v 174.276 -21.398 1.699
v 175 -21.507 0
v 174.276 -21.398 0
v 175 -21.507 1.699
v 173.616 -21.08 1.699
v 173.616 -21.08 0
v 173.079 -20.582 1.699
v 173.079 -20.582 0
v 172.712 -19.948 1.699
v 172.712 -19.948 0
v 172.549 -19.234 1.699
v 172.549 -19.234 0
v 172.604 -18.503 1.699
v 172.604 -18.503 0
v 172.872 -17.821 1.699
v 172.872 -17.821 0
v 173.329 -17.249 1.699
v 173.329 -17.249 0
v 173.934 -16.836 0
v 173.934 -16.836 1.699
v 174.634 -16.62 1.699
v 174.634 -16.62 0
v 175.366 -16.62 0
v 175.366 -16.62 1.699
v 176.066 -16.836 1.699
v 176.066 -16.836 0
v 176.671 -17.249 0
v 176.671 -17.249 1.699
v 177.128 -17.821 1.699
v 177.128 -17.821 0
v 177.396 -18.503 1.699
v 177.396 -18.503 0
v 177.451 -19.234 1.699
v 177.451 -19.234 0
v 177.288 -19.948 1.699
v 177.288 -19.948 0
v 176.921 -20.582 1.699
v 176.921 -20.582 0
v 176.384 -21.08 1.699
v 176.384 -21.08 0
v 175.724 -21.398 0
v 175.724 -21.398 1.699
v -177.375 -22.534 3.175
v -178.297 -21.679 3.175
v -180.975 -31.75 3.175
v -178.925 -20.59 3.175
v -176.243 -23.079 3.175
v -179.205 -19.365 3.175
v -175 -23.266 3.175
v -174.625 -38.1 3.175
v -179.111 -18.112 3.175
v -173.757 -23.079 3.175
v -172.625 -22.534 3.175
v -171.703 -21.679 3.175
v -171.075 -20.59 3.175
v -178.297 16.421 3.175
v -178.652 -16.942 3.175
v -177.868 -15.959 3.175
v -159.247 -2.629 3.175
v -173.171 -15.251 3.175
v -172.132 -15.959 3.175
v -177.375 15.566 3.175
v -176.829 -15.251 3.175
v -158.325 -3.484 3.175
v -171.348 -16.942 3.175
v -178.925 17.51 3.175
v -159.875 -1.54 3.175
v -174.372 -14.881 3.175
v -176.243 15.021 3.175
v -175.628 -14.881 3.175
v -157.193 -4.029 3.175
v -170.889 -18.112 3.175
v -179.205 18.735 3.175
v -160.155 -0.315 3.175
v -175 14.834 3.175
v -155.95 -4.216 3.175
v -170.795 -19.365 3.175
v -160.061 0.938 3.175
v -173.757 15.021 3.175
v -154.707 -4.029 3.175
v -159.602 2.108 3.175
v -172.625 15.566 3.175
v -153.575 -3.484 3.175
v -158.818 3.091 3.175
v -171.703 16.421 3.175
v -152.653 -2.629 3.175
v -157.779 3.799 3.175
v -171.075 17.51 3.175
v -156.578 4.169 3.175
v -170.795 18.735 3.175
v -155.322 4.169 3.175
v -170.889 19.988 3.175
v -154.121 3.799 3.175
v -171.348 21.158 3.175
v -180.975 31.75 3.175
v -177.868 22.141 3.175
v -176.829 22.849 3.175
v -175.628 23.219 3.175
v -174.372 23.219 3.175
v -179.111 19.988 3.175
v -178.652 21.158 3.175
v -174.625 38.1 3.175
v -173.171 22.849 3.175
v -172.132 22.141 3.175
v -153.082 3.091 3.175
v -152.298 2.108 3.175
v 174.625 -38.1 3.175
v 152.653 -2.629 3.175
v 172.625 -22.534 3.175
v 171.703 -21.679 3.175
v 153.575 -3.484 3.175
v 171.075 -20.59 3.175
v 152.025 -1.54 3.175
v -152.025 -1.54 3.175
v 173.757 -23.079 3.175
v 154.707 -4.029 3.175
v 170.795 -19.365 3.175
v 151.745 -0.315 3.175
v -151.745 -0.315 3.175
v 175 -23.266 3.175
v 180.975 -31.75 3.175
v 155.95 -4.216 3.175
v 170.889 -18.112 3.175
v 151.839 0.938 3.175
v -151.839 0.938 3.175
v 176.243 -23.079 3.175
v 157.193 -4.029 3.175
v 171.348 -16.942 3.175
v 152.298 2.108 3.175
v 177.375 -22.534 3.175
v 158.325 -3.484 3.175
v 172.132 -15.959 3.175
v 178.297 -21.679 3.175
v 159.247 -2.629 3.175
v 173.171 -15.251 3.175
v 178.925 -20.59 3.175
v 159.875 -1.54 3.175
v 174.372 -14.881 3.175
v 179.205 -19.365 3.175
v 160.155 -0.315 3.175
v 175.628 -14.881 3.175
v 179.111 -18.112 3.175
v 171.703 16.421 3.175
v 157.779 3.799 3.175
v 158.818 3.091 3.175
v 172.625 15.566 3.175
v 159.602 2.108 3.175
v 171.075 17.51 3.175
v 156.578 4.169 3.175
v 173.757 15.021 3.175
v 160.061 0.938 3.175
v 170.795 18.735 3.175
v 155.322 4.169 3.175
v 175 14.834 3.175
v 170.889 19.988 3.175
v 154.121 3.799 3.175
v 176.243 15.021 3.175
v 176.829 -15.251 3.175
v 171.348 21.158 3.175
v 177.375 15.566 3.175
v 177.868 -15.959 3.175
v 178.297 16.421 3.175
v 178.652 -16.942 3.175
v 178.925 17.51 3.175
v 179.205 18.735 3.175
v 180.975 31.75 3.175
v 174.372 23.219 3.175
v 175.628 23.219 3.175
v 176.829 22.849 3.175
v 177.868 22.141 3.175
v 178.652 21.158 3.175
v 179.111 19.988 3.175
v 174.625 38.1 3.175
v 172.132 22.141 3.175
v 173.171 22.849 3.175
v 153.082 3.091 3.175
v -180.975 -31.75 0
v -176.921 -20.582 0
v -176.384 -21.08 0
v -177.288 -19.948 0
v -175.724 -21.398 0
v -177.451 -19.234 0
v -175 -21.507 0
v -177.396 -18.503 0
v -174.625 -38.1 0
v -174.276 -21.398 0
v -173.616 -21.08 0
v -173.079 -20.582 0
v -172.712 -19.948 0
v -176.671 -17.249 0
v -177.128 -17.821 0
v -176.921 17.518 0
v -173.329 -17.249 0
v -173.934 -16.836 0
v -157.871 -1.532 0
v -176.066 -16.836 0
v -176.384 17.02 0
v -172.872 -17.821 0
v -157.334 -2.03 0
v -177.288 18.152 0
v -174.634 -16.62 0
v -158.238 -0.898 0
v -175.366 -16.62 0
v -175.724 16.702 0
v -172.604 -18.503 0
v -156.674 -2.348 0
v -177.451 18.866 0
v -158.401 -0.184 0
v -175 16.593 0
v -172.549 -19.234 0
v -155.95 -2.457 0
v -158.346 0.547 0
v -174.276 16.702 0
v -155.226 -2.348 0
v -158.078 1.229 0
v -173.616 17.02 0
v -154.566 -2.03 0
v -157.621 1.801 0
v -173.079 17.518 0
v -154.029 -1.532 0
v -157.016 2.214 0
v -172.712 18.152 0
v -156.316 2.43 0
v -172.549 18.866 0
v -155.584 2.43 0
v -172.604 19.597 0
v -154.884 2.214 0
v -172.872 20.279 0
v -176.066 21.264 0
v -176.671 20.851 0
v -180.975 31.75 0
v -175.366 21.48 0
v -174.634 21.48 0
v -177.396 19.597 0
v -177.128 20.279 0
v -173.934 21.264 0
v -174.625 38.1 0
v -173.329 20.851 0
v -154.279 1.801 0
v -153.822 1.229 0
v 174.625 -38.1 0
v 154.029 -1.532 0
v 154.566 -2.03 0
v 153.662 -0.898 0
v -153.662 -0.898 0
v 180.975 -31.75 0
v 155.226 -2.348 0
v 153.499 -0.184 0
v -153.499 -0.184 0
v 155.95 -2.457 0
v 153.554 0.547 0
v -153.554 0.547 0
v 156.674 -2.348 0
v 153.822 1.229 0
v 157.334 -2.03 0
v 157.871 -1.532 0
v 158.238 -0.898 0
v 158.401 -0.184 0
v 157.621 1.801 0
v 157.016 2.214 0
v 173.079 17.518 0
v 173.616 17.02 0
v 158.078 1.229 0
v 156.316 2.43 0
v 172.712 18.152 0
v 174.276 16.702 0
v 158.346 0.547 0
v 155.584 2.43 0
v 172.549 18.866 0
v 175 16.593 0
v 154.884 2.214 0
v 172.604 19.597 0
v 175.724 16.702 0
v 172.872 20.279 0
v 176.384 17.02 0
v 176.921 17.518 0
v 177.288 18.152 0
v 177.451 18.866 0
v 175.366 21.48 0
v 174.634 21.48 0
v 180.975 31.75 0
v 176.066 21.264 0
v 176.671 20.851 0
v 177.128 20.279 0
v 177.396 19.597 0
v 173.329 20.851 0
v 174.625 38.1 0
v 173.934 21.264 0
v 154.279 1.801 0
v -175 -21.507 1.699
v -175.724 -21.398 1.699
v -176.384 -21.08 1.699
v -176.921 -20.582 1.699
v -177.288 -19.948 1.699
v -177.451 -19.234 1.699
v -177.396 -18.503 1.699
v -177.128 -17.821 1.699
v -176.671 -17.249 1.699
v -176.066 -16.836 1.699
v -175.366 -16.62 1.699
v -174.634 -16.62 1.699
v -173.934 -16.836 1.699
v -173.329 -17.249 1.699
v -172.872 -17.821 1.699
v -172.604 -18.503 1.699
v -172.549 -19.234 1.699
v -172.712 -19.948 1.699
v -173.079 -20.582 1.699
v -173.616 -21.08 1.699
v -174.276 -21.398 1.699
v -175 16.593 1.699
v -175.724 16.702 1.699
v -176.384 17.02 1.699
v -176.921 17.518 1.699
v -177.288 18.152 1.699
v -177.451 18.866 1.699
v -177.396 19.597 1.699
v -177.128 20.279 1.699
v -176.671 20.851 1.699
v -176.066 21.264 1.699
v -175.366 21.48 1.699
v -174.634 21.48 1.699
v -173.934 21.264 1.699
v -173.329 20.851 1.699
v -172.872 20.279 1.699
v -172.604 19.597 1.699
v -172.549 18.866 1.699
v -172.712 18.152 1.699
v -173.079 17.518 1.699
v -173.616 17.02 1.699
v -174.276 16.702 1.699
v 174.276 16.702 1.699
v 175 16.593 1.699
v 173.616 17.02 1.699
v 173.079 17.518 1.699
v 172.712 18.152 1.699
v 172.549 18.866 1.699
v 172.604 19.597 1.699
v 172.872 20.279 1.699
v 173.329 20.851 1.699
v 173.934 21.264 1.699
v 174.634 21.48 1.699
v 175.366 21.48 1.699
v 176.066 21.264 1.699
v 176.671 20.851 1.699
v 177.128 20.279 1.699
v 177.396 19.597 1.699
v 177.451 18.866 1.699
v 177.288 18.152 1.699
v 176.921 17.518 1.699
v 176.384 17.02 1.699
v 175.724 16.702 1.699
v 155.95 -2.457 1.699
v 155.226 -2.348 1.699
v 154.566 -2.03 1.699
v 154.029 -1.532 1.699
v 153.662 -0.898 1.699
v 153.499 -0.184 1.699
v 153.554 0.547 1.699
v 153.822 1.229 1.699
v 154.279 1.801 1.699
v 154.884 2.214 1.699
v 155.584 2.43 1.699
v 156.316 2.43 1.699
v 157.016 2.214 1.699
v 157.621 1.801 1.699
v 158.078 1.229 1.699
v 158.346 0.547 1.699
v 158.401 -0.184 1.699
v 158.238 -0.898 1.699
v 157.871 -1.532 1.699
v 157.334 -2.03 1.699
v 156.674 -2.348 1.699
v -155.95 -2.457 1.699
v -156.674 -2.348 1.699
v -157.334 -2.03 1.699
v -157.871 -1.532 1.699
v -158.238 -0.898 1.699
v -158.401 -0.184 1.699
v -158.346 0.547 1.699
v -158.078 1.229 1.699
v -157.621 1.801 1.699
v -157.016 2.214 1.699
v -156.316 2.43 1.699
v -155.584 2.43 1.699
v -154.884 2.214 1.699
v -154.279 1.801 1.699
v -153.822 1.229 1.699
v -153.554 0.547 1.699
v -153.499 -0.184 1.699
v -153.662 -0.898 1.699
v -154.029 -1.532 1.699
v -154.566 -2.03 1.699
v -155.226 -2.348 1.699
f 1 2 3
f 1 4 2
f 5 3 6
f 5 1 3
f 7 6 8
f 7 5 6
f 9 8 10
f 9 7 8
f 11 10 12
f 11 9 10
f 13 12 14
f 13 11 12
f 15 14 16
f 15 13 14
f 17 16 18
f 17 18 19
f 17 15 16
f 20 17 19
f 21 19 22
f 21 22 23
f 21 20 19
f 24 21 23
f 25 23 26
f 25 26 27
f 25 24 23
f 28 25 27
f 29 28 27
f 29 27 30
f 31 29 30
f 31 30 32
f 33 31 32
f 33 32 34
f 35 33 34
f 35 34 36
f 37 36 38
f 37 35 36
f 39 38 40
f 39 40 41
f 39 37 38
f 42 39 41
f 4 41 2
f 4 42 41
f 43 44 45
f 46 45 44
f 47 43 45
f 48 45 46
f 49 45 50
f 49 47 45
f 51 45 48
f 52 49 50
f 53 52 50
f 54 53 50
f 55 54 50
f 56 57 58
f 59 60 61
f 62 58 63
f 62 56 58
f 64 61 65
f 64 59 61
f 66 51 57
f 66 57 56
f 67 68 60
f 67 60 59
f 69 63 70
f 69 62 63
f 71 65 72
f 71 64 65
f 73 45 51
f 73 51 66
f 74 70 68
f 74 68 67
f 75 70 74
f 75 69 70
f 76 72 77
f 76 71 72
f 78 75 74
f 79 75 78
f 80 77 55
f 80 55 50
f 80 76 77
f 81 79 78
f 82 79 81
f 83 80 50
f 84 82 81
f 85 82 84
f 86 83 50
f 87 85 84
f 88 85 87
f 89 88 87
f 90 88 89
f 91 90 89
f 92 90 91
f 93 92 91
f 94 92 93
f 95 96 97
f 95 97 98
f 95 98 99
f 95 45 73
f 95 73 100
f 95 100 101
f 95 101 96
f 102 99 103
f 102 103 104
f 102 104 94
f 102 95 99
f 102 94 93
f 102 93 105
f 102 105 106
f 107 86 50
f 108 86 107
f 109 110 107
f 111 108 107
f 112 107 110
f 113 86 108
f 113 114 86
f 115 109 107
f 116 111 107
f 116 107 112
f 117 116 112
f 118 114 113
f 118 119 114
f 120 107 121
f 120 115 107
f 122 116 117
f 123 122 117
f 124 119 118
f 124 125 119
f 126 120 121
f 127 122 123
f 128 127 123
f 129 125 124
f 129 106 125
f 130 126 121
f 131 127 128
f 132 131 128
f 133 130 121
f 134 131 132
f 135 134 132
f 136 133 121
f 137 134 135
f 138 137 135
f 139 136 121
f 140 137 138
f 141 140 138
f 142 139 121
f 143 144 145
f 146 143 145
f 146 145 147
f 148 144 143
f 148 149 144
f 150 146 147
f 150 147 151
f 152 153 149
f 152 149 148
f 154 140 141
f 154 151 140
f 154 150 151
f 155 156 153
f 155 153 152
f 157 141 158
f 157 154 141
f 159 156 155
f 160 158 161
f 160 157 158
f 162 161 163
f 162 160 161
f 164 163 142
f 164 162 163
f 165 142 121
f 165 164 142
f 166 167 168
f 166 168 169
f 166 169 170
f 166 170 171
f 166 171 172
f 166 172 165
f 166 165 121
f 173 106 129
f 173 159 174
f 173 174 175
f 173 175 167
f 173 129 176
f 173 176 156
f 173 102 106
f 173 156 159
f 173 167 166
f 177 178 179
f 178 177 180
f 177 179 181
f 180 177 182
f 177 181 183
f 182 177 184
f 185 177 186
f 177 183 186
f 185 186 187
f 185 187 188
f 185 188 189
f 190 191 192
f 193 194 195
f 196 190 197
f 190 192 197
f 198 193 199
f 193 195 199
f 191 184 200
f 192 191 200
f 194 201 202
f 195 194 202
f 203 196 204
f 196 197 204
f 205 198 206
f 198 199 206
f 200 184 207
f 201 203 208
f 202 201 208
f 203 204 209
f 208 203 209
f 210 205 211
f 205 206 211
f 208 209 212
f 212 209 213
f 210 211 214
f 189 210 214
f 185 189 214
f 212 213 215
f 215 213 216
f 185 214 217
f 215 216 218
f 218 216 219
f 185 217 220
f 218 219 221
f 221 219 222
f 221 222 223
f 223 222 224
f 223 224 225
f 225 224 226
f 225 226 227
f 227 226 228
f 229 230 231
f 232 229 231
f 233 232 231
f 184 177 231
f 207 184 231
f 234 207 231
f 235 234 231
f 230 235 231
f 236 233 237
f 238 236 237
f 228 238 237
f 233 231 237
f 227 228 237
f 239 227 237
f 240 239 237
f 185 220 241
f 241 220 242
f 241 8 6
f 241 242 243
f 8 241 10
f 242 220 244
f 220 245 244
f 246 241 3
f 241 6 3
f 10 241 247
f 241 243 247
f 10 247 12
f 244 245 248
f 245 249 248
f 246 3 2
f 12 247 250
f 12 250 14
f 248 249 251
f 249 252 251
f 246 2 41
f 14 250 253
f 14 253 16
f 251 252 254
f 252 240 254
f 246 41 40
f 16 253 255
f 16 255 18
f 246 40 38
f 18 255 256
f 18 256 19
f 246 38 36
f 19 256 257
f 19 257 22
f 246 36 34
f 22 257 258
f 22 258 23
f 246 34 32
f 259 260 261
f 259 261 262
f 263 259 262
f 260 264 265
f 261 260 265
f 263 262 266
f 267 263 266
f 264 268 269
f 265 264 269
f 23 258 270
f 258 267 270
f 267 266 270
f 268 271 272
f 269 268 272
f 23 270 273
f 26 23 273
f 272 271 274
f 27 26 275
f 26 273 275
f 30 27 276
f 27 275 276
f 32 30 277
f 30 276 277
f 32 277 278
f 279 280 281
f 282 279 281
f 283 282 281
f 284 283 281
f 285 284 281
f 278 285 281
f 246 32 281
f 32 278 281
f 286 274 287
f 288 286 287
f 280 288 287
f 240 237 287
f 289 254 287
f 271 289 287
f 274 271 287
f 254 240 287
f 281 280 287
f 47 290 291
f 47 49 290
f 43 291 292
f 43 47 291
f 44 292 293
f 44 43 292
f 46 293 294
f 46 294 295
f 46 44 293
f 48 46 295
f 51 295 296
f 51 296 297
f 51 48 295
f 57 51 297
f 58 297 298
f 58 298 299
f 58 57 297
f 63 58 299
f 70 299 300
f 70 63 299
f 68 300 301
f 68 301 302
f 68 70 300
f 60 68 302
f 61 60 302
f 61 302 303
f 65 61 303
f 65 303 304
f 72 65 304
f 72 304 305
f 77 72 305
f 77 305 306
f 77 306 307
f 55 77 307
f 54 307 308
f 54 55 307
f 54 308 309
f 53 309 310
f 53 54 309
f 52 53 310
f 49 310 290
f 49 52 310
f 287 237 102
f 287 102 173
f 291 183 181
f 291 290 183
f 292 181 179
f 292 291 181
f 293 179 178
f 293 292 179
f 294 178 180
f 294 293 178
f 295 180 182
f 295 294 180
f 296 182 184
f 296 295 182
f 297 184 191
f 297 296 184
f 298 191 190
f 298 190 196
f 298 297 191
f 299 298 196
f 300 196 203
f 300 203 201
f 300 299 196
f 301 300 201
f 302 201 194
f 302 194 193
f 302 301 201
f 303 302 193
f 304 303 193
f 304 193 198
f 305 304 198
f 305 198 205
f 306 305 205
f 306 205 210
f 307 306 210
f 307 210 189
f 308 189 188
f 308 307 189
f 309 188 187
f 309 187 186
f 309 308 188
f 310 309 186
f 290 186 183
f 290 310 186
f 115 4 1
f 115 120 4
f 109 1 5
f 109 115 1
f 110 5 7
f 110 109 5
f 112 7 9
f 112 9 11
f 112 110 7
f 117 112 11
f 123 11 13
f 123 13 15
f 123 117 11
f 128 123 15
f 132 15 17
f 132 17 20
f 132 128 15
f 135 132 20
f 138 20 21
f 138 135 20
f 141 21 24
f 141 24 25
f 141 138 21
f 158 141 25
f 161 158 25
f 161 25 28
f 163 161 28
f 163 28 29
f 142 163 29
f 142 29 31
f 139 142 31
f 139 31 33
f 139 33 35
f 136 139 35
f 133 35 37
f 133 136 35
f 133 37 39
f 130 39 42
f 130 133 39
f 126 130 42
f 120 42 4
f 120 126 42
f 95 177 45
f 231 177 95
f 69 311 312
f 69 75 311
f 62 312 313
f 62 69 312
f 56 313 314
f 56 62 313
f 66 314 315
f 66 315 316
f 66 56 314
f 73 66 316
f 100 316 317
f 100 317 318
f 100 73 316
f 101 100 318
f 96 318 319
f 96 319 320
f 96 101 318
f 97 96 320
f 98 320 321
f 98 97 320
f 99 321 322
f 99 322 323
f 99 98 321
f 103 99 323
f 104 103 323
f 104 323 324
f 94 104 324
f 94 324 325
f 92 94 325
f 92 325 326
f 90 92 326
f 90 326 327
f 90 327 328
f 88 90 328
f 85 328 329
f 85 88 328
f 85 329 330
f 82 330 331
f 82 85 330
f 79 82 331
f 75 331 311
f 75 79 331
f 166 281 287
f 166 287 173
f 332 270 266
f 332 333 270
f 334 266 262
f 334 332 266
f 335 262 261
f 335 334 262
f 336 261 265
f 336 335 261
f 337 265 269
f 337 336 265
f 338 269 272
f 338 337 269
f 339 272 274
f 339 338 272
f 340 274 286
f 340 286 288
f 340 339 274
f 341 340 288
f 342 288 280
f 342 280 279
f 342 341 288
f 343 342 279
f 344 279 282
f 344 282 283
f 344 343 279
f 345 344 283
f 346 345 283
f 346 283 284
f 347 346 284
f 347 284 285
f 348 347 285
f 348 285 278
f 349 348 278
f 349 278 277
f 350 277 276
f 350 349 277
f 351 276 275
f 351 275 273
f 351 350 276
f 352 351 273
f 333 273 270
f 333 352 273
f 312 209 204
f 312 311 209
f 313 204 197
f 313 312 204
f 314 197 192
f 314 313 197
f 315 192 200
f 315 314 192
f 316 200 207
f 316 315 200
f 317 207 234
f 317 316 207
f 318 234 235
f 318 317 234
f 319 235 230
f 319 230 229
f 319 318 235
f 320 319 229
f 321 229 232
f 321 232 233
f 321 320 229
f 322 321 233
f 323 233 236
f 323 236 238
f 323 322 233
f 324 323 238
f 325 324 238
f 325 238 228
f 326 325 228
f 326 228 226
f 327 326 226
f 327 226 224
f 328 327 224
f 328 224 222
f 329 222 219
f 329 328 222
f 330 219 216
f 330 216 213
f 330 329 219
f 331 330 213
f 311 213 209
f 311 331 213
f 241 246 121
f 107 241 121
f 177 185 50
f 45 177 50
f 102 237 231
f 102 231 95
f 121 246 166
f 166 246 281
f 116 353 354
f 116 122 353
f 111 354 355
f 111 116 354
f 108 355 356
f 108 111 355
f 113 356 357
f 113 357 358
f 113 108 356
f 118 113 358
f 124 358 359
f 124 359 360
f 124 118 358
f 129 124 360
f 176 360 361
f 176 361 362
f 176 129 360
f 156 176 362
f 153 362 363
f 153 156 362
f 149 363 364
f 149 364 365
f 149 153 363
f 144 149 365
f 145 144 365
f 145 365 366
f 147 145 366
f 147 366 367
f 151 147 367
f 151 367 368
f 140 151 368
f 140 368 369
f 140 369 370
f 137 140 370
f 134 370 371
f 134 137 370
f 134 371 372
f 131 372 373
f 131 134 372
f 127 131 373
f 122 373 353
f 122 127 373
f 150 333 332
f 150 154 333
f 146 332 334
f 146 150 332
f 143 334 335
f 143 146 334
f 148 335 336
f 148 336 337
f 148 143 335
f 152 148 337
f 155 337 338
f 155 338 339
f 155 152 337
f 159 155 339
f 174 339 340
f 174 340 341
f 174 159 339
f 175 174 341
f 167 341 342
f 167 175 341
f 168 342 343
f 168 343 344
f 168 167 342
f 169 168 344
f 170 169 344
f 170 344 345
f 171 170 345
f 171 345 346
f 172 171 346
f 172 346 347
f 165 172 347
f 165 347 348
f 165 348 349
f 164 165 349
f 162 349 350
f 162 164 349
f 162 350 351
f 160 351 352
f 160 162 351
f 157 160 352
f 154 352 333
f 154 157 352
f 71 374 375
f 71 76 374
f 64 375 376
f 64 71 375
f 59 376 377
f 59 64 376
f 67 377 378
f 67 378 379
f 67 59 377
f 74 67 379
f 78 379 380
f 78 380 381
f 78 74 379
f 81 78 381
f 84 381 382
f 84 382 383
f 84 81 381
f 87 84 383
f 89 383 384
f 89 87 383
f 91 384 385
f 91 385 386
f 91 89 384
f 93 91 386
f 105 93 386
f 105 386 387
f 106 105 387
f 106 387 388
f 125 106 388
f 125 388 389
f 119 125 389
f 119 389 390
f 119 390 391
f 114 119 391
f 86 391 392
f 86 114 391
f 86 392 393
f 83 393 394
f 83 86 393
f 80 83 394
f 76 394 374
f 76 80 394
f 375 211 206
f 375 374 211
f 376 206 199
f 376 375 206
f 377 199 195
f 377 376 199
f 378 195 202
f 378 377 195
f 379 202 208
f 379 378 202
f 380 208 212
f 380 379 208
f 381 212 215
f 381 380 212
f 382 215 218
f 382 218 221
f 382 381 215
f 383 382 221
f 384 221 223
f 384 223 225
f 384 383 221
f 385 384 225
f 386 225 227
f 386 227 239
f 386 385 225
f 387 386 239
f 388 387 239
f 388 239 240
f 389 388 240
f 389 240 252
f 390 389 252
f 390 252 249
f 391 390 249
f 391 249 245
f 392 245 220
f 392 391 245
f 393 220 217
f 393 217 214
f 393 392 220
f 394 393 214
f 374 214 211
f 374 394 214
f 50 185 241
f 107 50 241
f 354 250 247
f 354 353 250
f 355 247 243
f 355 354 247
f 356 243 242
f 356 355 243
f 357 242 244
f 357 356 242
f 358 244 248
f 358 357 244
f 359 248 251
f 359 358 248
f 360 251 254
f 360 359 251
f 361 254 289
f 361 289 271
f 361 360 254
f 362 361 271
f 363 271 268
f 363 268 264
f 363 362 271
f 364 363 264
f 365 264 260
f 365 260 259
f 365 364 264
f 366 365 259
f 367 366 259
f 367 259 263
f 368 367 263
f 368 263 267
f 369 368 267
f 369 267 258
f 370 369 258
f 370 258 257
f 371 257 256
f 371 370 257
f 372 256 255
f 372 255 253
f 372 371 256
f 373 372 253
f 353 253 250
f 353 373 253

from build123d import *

# Parameters (mm, degrees)
SKETCH1_W                                 = 361.95
SKETCH1_H                                 = 76.2
BOSS_EXTRUDE1_DEPTH                       = 3.175
CSK_FOR_8_FLAT_HEAD_MACHINE_SCREW_2_COUNT = 2
CSK_FOR_8_FLAT_HEAD_MACHINE_SCREW_2_PITCH = 349.999999988
CSK_FOR_8_FLAT_HEAD_MACHINE_SCREW_3_COUNT = 2
CSK_FOR_8_FLAT_HEAD_MACHINE_SCREW_3_PITCH = 352.067621334
CSK_FOR_8_FLAT_HEAD_MACHINE_SCREW_4_COUNT = 2
CSK_FOR_8_FLAT_HEAD_MACHINE_SCREW_4_PITCH = 331.497820494
CSK_FOR_8_FLAT_HEAD_MACHINE_SCREW_5_COUNT = 2
CSK_FOR_8_FLAT_HEAD_MACHINE_SCREW_5_PITCH = 26.940768363
CSK_FOR_8_FLAT_HEAD_MACHINE_SCREW_6_COUNT = 2
CSK_FOR_8_FLAT_HEAD_MACHINE_SCREW_6_PITCH = 38.1
CHAMFER1_SIZE                             = 6.35


with BuildPart() as part:
    # Sketch1 → Boss-Extrude1 (new body)
    with BuildSketch(Plane.XY):
        Rectangle(SKETCH1_W, SKETCH1_H)
    extrude(amount=BOSS_EXTRUDE1_DEPTH)

    # Sketch3 → CSK for #8 Flat Head Machine Screw (100)1 (revolve, cut)
    with BuildSketch(Plane(origin=(-174.999999994, 19.05, 3.175), x_dir=(0, -1, 0), z_dir=(1, 0, 0))):
        Polygon((0, 0), (0, 3.175), (2.45745, 3.175), (2.45745, 1.475934296), (4.2164, 0), align=None)
    csk_for_8_flat_head_machine_screw_100 = revolve(axis=Axis((-174.999999994, 19.05, 9.525), (0, 0, -1)), mode=Mode.SUBTRACT)

    # CSK for _8 Flat Head Machine Screw _ 2: CSK for #8 Flat Head Machine Screw (100)1 ×2
    with Locations(*[(i * CSK_FOR_8_FLAT_HEAD_MACHINE_SCREW_2_PITCH, 0, 0) for i in range(1, CSK_FOR_8_FLAT_HEAD_MACHINE_SCREW_2_COUNT)]):
        add(csk_for_8_flat_head_machine_screw_100, mode=Mode.SUBTRACT)

    # CSK for _8 Flat Head Machine Screw _ 3: CSK for #8 Flat Head Machine Screw (100)1 ×2
    with Locations(*[Vector(0.9941272039220534, -0.10821784705916154, 0) * (i * CSK_FOR_8_FLAT_HEAD_MACHINE_SCREW_3_PITCH) for i in range(1, CSK_FOR_8_FLAT_HEAD_MACHINE_SCREW_3_COUNT)]):
        add(csk_for_8_flat_head_machine_screw_100, mode=Mode.SUBTRACT)

    # CSK for _8 Flat Head Machine Screw _ 4: CSK for #8 Flat Head Machine Screw (100)1 ×2
    with Locations(*[Vector(0.9983474385899155, -0.05746644117182559, 0) * (i * CSK_FOR_8_FLAT_HEAD_MACHINE_SCREW_4_PITCH) for i in range(1, CSK_FOR_8_FLAT_HEAD_MACHINE_SCREW_4_COUNT)]):
        add(csk_for_8_flat_head_machine_screw_100, mode=Mode.SUBTRACT)

    # CSK for _8 Flat Head Machine Screw _ 5: CSK for #8 Flat Head Machine Screw (100)1 ×2
    with Locations(*[Vector(0.7071067811865517, -0.7071067811865435, 0) * (i * CSK_FOR_8_FLAT_HEAD_MACHINE_SCREW_5_PITCH) for i in range(1, CSK_FOR_8_FLAT_HEAD_MACHINE_SCREW_5_COUNT)]):
        add(csk_for_8_flat_head_machine_screw_100, mode=Mode.SUBTRACT)

    # CSK for _8 Flat Head Machine Screw _ 6: CSK for #8 Flat Head Machine Screw (100)1 ×2
    with Locations(*[(0, -i * CSK_FOR_8_FLAT_HEAD_MACHINE_SCREW_6_PITCH, 0) for i in range(1, CSK_FOR_8_FLAT_HEAD_MACHINE_SCREW_6_COUNT)]):
        add(csk_for_8_flat_head_machine_screw_100, mode=Mode.SUBTRACT)

    # Chamfer1
    chamfer1_edges = [part.edges().sort_by_distance(p)[0] for p in [
        (-180.975, 38.1, 1.5875),
        (180.975, 38.1, 1.5875),
        (180.975, -38.1, 1.5875),
        (-180.975, -38.1, 1.5875),
    ]]
    chamfer(chamfer1_edges, length=CHAMFER1_SIZE)


solid = part.part
